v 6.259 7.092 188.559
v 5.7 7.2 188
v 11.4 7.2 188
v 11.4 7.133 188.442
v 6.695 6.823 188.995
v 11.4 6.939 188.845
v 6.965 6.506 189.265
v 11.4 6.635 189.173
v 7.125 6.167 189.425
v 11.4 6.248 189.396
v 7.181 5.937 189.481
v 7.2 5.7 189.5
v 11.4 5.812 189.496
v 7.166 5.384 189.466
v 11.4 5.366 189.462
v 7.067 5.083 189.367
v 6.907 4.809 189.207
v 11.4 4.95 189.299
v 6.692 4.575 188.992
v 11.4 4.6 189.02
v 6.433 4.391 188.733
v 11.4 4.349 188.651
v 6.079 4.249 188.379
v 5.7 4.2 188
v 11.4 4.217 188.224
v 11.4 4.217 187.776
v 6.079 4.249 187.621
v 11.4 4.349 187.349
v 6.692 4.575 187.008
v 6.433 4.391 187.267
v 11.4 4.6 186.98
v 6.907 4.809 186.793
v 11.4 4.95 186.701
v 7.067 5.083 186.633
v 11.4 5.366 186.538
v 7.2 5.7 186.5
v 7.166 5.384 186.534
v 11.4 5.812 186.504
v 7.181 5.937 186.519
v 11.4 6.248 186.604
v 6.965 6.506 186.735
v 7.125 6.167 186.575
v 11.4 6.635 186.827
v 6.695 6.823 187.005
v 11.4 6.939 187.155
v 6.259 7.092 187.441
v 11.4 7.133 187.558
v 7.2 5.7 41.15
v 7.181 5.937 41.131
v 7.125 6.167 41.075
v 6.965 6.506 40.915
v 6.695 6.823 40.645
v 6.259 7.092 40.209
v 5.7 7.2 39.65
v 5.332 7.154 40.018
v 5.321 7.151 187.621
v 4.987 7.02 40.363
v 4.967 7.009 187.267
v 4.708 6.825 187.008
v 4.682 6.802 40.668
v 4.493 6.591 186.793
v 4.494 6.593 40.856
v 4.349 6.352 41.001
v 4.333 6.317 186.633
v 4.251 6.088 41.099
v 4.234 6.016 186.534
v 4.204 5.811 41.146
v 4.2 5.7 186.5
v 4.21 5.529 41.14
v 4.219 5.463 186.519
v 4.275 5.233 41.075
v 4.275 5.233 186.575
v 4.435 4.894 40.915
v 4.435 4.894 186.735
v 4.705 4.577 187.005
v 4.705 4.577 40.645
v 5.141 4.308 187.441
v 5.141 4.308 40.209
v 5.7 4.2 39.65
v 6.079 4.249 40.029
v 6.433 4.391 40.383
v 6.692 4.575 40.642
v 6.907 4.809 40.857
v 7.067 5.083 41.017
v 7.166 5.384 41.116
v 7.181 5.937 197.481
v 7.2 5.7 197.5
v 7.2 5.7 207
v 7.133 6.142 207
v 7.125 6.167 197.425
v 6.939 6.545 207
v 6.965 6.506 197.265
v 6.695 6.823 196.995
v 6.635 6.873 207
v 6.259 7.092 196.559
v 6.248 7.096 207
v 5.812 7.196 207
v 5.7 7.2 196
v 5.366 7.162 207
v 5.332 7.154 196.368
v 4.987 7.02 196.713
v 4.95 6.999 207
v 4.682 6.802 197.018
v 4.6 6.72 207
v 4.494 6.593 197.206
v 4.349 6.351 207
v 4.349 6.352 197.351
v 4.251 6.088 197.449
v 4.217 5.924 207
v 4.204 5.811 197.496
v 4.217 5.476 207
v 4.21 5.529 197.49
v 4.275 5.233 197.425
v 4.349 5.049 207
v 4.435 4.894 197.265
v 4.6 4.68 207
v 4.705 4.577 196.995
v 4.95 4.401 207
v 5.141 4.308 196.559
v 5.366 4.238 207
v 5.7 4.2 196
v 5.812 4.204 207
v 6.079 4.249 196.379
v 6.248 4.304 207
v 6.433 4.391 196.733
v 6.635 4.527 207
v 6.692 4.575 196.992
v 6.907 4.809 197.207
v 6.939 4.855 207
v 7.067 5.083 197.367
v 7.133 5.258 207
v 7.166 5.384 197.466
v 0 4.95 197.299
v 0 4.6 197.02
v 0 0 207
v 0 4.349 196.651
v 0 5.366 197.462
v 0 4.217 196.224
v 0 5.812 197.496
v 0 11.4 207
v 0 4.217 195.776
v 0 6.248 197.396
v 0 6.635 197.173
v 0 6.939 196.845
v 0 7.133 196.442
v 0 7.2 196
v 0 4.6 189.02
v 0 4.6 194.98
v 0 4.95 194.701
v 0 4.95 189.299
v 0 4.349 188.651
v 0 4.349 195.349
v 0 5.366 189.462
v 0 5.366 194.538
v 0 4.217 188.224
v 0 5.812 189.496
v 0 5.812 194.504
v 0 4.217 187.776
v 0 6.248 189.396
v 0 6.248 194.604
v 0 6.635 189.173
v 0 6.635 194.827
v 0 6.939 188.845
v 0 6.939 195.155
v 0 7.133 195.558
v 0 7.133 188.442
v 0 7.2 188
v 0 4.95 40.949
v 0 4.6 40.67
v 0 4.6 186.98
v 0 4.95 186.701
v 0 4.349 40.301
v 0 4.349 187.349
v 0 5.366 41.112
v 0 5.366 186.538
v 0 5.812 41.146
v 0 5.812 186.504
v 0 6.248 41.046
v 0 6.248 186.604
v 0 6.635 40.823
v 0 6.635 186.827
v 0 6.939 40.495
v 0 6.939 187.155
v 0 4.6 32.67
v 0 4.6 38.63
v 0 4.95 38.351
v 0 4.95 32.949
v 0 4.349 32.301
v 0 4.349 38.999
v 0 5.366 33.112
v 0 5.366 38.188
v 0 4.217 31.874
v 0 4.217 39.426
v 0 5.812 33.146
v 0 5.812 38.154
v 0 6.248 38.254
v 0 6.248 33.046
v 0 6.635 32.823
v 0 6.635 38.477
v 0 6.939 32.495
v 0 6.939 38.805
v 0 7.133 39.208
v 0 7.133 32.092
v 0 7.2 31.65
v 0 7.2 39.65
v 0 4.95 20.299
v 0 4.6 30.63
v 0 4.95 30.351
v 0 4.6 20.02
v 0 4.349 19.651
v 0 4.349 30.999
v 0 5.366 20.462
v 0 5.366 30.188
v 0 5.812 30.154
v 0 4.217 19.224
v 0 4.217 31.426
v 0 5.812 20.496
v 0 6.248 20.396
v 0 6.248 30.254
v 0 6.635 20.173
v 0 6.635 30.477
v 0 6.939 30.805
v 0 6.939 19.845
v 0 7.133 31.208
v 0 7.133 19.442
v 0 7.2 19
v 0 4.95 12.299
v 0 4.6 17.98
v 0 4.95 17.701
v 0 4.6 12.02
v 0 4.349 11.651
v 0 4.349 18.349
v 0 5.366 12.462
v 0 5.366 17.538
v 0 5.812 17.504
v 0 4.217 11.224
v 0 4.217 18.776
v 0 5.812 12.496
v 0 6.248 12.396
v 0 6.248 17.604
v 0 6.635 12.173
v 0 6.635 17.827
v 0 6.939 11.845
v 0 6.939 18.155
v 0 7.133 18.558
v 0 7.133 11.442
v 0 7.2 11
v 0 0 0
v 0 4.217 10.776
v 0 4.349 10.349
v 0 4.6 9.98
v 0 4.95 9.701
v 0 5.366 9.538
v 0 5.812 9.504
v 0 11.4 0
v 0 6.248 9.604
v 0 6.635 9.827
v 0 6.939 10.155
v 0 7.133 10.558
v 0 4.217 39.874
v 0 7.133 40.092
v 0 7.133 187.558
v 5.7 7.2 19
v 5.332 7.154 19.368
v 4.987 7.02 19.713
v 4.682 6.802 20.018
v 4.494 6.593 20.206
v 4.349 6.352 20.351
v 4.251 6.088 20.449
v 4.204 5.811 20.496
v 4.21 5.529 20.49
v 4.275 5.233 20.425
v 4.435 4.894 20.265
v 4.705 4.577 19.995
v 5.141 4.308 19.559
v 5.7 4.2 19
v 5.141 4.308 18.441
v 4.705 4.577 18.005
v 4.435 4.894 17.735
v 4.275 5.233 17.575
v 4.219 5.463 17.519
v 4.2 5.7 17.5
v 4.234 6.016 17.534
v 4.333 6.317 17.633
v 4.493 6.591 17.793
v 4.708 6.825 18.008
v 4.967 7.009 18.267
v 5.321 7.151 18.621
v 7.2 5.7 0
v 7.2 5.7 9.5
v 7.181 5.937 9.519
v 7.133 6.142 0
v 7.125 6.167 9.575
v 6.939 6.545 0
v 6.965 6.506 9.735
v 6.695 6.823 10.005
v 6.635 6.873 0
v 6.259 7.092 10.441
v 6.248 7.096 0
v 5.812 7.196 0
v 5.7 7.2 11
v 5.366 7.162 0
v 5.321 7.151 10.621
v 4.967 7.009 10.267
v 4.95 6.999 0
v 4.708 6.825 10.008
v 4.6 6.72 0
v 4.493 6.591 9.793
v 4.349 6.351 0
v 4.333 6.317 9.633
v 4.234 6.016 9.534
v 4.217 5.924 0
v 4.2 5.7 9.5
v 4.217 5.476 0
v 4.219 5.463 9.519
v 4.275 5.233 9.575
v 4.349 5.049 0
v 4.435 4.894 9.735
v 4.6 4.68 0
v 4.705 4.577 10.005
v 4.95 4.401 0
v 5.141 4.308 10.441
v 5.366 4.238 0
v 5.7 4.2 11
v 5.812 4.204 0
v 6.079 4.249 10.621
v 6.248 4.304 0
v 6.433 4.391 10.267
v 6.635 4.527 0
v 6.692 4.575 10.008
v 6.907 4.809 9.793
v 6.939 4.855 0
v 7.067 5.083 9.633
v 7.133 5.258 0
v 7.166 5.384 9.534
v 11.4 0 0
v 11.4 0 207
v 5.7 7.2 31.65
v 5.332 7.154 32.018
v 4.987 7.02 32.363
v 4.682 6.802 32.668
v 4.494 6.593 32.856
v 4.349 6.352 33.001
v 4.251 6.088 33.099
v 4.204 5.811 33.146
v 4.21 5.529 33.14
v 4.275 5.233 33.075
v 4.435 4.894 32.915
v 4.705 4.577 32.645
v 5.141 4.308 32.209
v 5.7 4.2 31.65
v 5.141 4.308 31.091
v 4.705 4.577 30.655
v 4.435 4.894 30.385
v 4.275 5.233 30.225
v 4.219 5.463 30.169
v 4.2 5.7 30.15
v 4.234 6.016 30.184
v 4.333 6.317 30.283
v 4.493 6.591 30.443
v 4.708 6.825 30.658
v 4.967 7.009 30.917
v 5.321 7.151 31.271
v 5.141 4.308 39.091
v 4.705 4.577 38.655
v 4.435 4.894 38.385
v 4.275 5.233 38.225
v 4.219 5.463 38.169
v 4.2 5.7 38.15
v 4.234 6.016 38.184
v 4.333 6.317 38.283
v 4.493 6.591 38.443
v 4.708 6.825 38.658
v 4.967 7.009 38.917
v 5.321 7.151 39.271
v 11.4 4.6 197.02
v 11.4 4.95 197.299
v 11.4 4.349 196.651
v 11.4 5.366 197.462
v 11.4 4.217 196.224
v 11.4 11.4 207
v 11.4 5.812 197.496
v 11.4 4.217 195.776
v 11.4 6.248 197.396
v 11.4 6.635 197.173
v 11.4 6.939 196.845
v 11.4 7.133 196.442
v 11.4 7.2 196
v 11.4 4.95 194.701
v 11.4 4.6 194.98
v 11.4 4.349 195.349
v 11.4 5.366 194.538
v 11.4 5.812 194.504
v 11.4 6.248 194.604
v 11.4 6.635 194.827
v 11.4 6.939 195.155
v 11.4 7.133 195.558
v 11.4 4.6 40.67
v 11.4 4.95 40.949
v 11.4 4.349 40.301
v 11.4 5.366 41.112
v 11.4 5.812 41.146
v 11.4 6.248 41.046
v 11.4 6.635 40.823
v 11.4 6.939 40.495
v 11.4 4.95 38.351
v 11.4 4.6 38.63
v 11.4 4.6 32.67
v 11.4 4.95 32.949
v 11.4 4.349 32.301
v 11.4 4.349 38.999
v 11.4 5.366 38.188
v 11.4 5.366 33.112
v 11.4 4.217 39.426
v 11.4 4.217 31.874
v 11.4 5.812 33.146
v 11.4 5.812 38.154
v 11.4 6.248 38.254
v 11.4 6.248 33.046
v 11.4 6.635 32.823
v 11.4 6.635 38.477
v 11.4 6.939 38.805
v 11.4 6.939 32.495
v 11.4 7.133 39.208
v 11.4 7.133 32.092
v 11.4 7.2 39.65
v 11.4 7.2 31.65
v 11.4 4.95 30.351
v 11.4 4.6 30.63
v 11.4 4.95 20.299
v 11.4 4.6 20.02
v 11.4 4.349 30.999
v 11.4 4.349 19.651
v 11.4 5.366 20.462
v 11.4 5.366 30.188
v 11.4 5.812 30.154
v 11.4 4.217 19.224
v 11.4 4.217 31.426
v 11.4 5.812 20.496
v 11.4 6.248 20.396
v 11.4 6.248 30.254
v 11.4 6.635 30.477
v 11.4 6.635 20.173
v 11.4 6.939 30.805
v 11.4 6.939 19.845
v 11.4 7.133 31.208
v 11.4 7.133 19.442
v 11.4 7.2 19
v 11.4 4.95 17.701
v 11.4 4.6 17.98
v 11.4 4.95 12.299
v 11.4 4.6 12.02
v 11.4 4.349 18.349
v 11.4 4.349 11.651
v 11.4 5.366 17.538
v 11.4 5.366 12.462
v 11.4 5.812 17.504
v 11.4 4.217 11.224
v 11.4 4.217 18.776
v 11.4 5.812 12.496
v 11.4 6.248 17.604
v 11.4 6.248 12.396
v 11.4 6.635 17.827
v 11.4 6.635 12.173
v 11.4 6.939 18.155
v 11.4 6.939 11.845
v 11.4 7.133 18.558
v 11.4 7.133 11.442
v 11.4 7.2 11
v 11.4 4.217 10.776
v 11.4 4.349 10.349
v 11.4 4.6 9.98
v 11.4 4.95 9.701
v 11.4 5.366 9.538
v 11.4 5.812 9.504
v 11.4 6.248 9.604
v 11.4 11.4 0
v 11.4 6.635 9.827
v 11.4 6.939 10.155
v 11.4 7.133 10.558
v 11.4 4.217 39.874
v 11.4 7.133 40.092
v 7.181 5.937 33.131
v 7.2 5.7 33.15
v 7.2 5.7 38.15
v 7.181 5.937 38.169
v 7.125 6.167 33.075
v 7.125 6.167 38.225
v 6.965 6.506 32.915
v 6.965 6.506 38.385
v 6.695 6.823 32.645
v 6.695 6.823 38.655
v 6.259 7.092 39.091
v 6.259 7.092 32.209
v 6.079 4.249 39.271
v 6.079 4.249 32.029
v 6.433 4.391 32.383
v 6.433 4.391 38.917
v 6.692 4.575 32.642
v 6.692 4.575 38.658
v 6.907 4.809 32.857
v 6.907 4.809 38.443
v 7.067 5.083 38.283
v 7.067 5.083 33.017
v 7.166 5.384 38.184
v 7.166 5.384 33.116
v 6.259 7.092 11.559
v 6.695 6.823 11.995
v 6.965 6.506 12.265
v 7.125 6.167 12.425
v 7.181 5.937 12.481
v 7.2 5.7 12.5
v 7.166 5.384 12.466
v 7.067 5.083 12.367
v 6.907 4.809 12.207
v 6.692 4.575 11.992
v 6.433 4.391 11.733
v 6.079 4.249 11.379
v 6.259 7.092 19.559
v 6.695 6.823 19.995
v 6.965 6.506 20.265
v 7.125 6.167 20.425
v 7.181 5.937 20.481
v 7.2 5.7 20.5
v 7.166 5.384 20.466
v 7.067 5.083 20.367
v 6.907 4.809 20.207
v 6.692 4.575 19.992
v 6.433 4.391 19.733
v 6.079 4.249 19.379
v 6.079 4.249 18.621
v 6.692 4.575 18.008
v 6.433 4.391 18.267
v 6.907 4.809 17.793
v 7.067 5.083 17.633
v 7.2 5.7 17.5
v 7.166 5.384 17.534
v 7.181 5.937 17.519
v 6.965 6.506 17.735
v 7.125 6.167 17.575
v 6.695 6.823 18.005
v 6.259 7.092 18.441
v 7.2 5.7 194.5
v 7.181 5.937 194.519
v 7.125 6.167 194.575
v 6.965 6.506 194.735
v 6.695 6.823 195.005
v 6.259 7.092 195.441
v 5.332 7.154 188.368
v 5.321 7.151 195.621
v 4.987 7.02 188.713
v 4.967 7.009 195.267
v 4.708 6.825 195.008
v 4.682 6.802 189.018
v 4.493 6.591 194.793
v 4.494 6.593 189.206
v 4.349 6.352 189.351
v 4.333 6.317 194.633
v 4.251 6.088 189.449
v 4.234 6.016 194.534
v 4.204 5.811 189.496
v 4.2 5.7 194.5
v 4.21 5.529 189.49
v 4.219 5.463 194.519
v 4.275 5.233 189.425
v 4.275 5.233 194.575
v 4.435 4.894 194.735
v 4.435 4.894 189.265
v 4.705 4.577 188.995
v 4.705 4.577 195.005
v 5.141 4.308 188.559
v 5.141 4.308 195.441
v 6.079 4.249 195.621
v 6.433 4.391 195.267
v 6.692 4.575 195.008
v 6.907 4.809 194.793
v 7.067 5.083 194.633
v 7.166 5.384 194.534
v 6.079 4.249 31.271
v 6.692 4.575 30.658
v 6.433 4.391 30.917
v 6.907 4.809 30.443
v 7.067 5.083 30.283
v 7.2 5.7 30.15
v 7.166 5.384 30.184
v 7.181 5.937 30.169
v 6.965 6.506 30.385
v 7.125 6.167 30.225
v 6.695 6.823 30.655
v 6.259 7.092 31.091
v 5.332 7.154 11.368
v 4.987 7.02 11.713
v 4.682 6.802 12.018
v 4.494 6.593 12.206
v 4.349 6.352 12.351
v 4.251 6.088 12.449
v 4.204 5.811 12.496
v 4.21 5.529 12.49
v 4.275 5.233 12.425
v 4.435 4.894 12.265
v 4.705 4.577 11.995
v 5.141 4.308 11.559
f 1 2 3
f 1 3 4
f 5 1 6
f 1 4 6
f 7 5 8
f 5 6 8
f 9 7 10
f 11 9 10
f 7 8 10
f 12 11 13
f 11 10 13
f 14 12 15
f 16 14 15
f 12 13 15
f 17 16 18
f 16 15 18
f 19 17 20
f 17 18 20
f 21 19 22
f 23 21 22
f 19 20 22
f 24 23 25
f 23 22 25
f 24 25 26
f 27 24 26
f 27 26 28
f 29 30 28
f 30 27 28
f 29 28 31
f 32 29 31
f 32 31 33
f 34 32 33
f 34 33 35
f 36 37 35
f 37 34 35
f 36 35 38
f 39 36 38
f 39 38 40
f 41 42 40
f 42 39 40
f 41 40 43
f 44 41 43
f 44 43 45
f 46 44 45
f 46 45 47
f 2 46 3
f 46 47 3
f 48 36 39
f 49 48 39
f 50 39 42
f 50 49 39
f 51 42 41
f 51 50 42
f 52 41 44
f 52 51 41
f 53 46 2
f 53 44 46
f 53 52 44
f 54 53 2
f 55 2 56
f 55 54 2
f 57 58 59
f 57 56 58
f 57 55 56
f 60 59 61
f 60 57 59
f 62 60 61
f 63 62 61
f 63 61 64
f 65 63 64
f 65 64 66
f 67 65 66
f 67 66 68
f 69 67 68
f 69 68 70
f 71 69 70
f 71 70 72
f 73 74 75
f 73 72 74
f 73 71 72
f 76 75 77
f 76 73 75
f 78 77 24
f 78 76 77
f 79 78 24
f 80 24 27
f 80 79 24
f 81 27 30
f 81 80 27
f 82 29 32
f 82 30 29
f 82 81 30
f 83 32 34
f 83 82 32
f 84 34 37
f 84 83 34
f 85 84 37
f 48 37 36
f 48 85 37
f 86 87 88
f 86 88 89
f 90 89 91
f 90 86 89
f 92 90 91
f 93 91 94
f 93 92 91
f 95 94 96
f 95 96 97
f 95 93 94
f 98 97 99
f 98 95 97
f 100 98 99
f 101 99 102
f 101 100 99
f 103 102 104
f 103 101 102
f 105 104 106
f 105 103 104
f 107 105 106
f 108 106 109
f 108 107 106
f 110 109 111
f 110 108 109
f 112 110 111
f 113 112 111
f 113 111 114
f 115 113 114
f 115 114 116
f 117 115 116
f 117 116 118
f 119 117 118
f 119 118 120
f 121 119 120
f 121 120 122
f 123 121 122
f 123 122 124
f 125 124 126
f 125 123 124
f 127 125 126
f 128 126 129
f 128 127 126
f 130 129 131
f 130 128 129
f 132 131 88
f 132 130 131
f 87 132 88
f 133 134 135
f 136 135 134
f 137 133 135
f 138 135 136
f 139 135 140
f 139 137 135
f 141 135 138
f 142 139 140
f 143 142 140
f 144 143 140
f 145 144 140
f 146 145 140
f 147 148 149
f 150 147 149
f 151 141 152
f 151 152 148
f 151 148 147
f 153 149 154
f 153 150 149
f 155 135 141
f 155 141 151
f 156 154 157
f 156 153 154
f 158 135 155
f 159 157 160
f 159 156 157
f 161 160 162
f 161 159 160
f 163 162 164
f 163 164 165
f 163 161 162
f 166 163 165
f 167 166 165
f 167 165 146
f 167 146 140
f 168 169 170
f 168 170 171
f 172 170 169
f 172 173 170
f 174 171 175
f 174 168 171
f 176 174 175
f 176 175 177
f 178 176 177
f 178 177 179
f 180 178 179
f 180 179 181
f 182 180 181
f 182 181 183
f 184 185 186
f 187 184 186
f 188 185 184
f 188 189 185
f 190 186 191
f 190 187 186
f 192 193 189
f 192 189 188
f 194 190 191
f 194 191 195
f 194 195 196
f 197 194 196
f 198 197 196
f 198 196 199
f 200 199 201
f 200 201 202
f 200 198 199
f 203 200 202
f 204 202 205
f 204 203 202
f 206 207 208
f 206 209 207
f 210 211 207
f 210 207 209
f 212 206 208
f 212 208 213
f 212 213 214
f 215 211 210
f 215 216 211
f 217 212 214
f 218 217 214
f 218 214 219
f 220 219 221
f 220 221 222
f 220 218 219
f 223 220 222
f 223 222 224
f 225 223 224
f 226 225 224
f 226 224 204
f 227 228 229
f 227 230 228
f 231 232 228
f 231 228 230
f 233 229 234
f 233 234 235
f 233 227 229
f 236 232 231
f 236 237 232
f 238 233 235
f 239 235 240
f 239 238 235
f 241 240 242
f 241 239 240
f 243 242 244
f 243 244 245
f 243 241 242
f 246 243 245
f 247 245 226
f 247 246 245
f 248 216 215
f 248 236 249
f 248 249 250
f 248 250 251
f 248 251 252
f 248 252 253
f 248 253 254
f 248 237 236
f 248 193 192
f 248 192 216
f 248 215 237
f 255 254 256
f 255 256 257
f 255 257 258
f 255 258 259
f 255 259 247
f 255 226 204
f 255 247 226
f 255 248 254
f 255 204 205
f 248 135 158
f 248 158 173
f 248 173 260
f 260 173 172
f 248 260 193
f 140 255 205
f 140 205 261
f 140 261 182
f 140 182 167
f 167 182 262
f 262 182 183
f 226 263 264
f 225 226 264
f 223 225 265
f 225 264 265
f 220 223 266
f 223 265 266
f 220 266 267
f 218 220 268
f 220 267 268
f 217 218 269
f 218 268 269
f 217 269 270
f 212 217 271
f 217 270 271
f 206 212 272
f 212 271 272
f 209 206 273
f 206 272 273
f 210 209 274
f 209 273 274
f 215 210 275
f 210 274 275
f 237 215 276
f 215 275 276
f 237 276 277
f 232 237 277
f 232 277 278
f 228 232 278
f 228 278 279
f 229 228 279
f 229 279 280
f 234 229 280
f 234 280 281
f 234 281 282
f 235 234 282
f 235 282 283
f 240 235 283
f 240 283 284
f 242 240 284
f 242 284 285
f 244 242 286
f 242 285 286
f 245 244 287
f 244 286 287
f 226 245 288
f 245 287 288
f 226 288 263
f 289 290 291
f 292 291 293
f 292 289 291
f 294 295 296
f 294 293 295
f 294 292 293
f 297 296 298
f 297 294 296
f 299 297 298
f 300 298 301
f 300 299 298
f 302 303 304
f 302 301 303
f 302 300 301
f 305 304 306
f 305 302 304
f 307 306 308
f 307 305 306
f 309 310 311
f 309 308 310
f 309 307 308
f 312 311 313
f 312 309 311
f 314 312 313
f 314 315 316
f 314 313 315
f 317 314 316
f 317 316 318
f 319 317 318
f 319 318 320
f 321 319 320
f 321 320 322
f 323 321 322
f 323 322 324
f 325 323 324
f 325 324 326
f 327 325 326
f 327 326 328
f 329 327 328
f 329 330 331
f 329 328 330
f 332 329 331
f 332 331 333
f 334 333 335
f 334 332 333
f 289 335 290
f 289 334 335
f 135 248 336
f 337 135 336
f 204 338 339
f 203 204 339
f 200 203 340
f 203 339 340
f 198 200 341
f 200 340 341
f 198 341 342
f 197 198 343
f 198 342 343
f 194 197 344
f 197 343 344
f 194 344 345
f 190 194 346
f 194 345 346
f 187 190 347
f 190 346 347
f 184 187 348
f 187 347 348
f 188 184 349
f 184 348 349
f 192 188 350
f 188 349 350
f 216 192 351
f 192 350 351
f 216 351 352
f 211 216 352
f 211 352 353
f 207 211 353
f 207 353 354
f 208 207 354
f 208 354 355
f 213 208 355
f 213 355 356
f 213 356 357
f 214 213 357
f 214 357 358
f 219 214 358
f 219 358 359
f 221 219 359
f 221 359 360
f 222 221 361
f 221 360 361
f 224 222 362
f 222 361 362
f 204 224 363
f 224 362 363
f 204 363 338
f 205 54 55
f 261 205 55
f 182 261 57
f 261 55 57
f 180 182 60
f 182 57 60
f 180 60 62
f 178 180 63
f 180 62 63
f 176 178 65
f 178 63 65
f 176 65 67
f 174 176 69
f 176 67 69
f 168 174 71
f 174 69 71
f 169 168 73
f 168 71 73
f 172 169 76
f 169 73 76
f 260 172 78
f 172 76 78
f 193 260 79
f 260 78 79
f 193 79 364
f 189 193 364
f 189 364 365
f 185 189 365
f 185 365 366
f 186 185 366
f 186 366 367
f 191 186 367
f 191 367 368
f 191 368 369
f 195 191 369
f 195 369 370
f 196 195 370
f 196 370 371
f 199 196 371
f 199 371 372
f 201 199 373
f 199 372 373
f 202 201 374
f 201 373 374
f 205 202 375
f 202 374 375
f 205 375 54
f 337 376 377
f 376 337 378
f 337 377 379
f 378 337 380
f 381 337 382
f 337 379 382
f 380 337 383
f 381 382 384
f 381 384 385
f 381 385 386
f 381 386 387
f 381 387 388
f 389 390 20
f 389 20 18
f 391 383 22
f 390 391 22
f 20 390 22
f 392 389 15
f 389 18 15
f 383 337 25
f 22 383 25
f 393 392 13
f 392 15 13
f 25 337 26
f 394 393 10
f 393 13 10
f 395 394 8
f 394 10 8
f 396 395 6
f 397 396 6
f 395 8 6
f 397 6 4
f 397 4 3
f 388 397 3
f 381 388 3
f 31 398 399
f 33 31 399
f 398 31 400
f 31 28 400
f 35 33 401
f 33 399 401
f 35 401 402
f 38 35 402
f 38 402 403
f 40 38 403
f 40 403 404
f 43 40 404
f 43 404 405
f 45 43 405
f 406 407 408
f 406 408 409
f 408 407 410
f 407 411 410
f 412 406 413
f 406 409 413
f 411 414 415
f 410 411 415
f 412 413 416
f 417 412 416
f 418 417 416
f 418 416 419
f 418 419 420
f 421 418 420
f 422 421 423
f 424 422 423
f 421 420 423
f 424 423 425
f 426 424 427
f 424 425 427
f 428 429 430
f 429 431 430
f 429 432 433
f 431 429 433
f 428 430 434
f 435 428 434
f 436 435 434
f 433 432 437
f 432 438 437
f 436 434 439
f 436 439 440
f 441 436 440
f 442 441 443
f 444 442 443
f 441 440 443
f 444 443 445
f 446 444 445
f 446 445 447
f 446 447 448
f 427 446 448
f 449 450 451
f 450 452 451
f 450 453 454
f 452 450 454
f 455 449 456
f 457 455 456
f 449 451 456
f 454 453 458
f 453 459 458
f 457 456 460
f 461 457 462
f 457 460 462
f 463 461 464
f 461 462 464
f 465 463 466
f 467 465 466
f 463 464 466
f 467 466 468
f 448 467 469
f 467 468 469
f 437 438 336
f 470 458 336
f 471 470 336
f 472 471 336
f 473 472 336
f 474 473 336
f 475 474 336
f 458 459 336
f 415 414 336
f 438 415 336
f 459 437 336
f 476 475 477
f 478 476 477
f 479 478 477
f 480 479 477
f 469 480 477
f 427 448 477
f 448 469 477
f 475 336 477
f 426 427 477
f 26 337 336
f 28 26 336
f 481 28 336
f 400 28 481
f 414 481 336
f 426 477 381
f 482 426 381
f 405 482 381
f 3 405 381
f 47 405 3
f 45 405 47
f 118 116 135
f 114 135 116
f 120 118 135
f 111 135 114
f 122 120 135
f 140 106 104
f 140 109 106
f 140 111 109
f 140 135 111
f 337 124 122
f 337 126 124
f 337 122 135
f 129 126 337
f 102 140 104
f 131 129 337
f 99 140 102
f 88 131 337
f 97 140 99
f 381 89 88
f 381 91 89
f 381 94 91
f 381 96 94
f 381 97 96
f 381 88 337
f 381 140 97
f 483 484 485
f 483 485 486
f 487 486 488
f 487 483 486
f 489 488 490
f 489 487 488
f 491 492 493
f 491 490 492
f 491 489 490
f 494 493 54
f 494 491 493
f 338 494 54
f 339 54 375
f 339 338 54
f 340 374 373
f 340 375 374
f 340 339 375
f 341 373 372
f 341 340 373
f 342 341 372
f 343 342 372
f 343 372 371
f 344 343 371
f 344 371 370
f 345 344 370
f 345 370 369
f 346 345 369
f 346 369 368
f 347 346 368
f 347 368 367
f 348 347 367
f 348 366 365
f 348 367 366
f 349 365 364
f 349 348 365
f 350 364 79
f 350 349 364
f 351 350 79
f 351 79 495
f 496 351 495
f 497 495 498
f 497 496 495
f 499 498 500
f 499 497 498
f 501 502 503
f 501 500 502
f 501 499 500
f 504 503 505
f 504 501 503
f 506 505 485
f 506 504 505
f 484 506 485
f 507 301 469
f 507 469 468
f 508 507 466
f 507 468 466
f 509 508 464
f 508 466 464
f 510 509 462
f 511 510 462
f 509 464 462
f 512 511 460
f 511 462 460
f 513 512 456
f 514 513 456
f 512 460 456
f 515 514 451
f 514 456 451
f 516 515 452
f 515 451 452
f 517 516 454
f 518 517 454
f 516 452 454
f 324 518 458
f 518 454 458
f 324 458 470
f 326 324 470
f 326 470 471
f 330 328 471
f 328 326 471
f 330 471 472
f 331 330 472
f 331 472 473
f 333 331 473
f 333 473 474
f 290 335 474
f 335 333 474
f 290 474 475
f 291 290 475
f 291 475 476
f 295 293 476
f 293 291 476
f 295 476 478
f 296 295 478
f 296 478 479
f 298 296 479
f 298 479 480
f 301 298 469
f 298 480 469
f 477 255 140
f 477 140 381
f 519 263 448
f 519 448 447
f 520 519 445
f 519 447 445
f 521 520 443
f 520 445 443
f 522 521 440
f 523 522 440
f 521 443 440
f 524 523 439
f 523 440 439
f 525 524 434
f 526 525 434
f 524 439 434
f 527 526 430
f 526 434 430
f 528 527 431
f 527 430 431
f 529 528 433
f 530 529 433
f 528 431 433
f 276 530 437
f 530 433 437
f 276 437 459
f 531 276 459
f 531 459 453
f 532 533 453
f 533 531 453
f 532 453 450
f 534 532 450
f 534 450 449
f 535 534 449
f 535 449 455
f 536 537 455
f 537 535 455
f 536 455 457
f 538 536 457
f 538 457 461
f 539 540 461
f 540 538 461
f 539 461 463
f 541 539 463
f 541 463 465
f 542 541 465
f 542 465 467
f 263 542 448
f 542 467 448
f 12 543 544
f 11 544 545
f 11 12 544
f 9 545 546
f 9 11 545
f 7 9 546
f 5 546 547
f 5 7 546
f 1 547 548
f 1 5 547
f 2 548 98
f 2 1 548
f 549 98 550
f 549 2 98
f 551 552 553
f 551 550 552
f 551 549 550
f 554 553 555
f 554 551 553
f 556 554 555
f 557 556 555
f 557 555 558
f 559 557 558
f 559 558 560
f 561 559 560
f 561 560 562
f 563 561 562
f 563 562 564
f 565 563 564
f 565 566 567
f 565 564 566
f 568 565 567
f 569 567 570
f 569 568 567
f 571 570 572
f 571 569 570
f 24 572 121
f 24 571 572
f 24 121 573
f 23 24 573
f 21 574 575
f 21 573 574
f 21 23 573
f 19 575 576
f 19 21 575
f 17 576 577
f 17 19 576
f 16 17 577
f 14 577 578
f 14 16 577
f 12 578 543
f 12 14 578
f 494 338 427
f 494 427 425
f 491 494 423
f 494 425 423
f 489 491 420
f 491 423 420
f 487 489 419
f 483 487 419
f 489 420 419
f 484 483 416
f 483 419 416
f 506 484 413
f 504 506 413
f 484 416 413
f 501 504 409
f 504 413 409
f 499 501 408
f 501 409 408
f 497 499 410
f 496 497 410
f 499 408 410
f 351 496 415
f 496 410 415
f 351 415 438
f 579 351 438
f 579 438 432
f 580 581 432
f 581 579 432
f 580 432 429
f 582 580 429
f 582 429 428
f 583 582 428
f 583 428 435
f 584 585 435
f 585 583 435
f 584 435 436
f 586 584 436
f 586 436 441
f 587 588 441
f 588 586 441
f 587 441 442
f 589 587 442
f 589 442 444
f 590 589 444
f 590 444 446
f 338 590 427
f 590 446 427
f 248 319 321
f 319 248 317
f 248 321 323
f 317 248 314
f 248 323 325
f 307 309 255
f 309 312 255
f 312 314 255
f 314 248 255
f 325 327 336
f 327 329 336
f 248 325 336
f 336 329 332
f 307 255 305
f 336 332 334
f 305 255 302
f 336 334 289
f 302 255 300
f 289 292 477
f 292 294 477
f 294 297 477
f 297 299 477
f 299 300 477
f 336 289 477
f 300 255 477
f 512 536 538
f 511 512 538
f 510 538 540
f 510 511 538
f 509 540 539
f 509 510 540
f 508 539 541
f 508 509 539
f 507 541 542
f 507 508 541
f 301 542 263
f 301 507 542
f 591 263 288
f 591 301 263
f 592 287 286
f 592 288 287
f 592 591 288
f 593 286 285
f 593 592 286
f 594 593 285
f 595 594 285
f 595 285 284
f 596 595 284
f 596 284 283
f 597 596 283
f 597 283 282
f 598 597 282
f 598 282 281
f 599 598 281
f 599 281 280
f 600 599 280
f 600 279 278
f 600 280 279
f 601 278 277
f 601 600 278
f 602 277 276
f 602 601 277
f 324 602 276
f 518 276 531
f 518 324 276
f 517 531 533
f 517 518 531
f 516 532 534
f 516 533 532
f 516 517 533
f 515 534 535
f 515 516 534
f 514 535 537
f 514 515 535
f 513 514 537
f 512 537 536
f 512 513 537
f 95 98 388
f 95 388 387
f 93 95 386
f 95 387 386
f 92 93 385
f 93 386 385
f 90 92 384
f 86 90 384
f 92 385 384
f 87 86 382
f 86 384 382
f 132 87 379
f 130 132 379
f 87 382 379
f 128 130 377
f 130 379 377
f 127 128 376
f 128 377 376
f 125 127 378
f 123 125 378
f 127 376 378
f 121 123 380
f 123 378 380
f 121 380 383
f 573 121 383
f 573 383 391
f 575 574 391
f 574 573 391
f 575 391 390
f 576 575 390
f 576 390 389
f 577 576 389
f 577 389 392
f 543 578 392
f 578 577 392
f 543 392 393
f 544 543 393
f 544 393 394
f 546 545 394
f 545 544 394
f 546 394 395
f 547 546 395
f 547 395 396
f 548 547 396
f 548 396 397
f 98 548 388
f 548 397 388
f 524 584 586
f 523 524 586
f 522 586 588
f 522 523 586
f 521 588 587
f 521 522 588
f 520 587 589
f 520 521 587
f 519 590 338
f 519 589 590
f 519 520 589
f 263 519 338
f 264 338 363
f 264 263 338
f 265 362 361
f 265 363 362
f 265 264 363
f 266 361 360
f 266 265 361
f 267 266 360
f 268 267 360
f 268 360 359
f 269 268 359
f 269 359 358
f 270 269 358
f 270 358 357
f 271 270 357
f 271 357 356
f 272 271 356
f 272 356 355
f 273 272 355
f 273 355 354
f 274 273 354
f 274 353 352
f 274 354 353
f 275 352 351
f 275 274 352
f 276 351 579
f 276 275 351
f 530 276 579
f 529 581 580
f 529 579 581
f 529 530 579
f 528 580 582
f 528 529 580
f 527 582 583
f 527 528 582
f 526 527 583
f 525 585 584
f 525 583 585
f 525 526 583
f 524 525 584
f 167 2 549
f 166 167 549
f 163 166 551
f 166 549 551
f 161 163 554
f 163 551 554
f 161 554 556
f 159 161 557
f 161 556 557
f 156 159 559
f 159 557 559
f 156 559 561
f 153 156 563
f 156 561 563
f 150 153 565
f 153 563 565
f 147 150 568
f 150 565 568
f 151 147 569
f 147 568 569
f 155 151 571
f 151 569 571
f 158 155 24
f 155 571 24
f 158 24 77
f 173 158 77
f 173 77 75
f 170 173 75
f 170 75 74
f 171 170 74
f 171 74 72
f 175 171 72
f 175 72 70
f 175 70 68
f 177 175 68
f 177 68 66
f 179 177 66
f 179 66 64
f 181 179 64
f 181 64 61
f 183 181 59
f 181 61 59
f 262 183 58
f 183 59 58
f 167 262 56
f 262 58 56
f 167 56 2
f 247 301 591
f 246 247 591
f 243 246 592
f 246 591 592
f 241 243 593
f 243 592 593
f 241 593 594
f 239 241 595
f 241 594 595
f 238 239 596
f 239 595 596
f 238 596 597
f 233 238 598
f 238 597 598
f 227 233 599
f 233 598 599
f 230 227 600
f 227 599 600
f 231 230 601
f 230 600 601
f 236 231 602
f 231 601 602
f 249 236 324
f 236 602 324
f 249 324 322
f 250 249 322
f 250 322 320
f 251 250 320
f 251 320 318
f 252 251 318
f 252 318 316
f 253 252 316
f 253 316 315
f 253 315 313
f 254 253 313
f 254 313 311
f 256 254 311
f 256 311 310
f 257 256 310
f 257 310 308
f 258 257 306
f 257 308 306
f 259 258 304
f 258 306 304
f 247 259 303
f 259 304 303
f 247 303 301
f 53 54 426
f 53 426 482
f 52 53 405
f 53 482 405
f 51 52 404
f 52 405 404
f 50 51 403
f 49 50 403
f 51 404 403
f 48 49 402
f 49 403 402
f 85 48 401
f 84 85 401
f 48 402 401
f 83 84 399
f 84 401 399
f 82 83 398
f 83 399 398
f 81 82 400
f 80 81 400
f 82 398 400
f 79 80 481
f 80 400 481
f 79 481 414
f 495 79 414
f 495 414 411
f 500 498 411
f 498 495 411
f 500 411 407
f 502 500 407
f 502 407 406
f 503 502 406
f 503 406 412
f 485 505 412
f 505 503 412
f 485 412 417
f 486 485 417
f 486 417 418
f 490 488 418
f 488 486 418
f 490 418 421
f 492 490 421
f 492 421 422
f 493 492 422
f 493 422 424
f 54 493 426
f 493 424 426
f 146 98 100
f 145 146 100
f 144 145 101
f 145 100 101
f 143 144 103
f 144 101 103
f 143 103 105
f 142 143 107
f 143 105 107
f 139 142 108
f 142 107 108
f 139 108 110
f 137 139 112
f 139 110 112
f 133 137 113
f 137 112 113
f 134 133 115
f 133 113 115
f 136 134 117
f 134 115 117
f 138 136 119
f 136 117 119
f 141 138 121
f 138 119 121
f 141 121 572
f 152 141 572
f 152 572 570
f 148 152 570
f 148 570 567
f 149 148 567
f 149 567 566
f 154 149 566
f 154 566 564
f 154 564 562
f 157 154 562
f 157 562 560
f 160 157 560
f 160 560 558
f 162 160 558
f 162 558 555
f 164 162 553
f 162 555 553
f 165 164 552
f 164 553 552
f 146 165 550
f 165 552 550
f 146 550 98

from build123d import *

# Parameters (mm, degrees)
SKETCH_W     = 11.4
SKETCH_H     = 11.4
SKETCH_R     = 1.5
PAD_DEPTH    = 207
SKETCH001_R  = 1.5
POCKET_DEPTH = 11.401


with BuildPart() as part:
    # Sketch → Pad (new body)
    with BuildSketch(Plane.XY):
        with Locations((5.7, 5.7)):
            Rectangle(SKETCH_W, SKETCH_H)
        with Locations((5.7, 5.7)):
            Circle(SKETCH_R, mode=Mode.SUBTRACT)
    extrude(amount=PAD_DEPTH)

    # Sketch001 → Pocket (cut, through all)
    with BuildSketch(Plane.YZ.offset(11.4)):
        with Locations((5.7, 39.65)):
            Circle(SKETCH001_R)
        with Locations((5.7, 31.65)):
            Circle(SKETCH001_R)
        with Locations((5.7, 19)):
            Circle(SKETCH001_R)
        with Locations((5.7, 11)):
            Circle(SKETCH001_R)
        with Locations((5.7, 196)):
            Circle(SKETCH001_R)
        with Locations((5.7, 188)):
            Circle(SKETCH001_R)
    extrude(amount=-POCKET_DEPTH, mode=Mode.SUBTRACT)


solid = part.part
